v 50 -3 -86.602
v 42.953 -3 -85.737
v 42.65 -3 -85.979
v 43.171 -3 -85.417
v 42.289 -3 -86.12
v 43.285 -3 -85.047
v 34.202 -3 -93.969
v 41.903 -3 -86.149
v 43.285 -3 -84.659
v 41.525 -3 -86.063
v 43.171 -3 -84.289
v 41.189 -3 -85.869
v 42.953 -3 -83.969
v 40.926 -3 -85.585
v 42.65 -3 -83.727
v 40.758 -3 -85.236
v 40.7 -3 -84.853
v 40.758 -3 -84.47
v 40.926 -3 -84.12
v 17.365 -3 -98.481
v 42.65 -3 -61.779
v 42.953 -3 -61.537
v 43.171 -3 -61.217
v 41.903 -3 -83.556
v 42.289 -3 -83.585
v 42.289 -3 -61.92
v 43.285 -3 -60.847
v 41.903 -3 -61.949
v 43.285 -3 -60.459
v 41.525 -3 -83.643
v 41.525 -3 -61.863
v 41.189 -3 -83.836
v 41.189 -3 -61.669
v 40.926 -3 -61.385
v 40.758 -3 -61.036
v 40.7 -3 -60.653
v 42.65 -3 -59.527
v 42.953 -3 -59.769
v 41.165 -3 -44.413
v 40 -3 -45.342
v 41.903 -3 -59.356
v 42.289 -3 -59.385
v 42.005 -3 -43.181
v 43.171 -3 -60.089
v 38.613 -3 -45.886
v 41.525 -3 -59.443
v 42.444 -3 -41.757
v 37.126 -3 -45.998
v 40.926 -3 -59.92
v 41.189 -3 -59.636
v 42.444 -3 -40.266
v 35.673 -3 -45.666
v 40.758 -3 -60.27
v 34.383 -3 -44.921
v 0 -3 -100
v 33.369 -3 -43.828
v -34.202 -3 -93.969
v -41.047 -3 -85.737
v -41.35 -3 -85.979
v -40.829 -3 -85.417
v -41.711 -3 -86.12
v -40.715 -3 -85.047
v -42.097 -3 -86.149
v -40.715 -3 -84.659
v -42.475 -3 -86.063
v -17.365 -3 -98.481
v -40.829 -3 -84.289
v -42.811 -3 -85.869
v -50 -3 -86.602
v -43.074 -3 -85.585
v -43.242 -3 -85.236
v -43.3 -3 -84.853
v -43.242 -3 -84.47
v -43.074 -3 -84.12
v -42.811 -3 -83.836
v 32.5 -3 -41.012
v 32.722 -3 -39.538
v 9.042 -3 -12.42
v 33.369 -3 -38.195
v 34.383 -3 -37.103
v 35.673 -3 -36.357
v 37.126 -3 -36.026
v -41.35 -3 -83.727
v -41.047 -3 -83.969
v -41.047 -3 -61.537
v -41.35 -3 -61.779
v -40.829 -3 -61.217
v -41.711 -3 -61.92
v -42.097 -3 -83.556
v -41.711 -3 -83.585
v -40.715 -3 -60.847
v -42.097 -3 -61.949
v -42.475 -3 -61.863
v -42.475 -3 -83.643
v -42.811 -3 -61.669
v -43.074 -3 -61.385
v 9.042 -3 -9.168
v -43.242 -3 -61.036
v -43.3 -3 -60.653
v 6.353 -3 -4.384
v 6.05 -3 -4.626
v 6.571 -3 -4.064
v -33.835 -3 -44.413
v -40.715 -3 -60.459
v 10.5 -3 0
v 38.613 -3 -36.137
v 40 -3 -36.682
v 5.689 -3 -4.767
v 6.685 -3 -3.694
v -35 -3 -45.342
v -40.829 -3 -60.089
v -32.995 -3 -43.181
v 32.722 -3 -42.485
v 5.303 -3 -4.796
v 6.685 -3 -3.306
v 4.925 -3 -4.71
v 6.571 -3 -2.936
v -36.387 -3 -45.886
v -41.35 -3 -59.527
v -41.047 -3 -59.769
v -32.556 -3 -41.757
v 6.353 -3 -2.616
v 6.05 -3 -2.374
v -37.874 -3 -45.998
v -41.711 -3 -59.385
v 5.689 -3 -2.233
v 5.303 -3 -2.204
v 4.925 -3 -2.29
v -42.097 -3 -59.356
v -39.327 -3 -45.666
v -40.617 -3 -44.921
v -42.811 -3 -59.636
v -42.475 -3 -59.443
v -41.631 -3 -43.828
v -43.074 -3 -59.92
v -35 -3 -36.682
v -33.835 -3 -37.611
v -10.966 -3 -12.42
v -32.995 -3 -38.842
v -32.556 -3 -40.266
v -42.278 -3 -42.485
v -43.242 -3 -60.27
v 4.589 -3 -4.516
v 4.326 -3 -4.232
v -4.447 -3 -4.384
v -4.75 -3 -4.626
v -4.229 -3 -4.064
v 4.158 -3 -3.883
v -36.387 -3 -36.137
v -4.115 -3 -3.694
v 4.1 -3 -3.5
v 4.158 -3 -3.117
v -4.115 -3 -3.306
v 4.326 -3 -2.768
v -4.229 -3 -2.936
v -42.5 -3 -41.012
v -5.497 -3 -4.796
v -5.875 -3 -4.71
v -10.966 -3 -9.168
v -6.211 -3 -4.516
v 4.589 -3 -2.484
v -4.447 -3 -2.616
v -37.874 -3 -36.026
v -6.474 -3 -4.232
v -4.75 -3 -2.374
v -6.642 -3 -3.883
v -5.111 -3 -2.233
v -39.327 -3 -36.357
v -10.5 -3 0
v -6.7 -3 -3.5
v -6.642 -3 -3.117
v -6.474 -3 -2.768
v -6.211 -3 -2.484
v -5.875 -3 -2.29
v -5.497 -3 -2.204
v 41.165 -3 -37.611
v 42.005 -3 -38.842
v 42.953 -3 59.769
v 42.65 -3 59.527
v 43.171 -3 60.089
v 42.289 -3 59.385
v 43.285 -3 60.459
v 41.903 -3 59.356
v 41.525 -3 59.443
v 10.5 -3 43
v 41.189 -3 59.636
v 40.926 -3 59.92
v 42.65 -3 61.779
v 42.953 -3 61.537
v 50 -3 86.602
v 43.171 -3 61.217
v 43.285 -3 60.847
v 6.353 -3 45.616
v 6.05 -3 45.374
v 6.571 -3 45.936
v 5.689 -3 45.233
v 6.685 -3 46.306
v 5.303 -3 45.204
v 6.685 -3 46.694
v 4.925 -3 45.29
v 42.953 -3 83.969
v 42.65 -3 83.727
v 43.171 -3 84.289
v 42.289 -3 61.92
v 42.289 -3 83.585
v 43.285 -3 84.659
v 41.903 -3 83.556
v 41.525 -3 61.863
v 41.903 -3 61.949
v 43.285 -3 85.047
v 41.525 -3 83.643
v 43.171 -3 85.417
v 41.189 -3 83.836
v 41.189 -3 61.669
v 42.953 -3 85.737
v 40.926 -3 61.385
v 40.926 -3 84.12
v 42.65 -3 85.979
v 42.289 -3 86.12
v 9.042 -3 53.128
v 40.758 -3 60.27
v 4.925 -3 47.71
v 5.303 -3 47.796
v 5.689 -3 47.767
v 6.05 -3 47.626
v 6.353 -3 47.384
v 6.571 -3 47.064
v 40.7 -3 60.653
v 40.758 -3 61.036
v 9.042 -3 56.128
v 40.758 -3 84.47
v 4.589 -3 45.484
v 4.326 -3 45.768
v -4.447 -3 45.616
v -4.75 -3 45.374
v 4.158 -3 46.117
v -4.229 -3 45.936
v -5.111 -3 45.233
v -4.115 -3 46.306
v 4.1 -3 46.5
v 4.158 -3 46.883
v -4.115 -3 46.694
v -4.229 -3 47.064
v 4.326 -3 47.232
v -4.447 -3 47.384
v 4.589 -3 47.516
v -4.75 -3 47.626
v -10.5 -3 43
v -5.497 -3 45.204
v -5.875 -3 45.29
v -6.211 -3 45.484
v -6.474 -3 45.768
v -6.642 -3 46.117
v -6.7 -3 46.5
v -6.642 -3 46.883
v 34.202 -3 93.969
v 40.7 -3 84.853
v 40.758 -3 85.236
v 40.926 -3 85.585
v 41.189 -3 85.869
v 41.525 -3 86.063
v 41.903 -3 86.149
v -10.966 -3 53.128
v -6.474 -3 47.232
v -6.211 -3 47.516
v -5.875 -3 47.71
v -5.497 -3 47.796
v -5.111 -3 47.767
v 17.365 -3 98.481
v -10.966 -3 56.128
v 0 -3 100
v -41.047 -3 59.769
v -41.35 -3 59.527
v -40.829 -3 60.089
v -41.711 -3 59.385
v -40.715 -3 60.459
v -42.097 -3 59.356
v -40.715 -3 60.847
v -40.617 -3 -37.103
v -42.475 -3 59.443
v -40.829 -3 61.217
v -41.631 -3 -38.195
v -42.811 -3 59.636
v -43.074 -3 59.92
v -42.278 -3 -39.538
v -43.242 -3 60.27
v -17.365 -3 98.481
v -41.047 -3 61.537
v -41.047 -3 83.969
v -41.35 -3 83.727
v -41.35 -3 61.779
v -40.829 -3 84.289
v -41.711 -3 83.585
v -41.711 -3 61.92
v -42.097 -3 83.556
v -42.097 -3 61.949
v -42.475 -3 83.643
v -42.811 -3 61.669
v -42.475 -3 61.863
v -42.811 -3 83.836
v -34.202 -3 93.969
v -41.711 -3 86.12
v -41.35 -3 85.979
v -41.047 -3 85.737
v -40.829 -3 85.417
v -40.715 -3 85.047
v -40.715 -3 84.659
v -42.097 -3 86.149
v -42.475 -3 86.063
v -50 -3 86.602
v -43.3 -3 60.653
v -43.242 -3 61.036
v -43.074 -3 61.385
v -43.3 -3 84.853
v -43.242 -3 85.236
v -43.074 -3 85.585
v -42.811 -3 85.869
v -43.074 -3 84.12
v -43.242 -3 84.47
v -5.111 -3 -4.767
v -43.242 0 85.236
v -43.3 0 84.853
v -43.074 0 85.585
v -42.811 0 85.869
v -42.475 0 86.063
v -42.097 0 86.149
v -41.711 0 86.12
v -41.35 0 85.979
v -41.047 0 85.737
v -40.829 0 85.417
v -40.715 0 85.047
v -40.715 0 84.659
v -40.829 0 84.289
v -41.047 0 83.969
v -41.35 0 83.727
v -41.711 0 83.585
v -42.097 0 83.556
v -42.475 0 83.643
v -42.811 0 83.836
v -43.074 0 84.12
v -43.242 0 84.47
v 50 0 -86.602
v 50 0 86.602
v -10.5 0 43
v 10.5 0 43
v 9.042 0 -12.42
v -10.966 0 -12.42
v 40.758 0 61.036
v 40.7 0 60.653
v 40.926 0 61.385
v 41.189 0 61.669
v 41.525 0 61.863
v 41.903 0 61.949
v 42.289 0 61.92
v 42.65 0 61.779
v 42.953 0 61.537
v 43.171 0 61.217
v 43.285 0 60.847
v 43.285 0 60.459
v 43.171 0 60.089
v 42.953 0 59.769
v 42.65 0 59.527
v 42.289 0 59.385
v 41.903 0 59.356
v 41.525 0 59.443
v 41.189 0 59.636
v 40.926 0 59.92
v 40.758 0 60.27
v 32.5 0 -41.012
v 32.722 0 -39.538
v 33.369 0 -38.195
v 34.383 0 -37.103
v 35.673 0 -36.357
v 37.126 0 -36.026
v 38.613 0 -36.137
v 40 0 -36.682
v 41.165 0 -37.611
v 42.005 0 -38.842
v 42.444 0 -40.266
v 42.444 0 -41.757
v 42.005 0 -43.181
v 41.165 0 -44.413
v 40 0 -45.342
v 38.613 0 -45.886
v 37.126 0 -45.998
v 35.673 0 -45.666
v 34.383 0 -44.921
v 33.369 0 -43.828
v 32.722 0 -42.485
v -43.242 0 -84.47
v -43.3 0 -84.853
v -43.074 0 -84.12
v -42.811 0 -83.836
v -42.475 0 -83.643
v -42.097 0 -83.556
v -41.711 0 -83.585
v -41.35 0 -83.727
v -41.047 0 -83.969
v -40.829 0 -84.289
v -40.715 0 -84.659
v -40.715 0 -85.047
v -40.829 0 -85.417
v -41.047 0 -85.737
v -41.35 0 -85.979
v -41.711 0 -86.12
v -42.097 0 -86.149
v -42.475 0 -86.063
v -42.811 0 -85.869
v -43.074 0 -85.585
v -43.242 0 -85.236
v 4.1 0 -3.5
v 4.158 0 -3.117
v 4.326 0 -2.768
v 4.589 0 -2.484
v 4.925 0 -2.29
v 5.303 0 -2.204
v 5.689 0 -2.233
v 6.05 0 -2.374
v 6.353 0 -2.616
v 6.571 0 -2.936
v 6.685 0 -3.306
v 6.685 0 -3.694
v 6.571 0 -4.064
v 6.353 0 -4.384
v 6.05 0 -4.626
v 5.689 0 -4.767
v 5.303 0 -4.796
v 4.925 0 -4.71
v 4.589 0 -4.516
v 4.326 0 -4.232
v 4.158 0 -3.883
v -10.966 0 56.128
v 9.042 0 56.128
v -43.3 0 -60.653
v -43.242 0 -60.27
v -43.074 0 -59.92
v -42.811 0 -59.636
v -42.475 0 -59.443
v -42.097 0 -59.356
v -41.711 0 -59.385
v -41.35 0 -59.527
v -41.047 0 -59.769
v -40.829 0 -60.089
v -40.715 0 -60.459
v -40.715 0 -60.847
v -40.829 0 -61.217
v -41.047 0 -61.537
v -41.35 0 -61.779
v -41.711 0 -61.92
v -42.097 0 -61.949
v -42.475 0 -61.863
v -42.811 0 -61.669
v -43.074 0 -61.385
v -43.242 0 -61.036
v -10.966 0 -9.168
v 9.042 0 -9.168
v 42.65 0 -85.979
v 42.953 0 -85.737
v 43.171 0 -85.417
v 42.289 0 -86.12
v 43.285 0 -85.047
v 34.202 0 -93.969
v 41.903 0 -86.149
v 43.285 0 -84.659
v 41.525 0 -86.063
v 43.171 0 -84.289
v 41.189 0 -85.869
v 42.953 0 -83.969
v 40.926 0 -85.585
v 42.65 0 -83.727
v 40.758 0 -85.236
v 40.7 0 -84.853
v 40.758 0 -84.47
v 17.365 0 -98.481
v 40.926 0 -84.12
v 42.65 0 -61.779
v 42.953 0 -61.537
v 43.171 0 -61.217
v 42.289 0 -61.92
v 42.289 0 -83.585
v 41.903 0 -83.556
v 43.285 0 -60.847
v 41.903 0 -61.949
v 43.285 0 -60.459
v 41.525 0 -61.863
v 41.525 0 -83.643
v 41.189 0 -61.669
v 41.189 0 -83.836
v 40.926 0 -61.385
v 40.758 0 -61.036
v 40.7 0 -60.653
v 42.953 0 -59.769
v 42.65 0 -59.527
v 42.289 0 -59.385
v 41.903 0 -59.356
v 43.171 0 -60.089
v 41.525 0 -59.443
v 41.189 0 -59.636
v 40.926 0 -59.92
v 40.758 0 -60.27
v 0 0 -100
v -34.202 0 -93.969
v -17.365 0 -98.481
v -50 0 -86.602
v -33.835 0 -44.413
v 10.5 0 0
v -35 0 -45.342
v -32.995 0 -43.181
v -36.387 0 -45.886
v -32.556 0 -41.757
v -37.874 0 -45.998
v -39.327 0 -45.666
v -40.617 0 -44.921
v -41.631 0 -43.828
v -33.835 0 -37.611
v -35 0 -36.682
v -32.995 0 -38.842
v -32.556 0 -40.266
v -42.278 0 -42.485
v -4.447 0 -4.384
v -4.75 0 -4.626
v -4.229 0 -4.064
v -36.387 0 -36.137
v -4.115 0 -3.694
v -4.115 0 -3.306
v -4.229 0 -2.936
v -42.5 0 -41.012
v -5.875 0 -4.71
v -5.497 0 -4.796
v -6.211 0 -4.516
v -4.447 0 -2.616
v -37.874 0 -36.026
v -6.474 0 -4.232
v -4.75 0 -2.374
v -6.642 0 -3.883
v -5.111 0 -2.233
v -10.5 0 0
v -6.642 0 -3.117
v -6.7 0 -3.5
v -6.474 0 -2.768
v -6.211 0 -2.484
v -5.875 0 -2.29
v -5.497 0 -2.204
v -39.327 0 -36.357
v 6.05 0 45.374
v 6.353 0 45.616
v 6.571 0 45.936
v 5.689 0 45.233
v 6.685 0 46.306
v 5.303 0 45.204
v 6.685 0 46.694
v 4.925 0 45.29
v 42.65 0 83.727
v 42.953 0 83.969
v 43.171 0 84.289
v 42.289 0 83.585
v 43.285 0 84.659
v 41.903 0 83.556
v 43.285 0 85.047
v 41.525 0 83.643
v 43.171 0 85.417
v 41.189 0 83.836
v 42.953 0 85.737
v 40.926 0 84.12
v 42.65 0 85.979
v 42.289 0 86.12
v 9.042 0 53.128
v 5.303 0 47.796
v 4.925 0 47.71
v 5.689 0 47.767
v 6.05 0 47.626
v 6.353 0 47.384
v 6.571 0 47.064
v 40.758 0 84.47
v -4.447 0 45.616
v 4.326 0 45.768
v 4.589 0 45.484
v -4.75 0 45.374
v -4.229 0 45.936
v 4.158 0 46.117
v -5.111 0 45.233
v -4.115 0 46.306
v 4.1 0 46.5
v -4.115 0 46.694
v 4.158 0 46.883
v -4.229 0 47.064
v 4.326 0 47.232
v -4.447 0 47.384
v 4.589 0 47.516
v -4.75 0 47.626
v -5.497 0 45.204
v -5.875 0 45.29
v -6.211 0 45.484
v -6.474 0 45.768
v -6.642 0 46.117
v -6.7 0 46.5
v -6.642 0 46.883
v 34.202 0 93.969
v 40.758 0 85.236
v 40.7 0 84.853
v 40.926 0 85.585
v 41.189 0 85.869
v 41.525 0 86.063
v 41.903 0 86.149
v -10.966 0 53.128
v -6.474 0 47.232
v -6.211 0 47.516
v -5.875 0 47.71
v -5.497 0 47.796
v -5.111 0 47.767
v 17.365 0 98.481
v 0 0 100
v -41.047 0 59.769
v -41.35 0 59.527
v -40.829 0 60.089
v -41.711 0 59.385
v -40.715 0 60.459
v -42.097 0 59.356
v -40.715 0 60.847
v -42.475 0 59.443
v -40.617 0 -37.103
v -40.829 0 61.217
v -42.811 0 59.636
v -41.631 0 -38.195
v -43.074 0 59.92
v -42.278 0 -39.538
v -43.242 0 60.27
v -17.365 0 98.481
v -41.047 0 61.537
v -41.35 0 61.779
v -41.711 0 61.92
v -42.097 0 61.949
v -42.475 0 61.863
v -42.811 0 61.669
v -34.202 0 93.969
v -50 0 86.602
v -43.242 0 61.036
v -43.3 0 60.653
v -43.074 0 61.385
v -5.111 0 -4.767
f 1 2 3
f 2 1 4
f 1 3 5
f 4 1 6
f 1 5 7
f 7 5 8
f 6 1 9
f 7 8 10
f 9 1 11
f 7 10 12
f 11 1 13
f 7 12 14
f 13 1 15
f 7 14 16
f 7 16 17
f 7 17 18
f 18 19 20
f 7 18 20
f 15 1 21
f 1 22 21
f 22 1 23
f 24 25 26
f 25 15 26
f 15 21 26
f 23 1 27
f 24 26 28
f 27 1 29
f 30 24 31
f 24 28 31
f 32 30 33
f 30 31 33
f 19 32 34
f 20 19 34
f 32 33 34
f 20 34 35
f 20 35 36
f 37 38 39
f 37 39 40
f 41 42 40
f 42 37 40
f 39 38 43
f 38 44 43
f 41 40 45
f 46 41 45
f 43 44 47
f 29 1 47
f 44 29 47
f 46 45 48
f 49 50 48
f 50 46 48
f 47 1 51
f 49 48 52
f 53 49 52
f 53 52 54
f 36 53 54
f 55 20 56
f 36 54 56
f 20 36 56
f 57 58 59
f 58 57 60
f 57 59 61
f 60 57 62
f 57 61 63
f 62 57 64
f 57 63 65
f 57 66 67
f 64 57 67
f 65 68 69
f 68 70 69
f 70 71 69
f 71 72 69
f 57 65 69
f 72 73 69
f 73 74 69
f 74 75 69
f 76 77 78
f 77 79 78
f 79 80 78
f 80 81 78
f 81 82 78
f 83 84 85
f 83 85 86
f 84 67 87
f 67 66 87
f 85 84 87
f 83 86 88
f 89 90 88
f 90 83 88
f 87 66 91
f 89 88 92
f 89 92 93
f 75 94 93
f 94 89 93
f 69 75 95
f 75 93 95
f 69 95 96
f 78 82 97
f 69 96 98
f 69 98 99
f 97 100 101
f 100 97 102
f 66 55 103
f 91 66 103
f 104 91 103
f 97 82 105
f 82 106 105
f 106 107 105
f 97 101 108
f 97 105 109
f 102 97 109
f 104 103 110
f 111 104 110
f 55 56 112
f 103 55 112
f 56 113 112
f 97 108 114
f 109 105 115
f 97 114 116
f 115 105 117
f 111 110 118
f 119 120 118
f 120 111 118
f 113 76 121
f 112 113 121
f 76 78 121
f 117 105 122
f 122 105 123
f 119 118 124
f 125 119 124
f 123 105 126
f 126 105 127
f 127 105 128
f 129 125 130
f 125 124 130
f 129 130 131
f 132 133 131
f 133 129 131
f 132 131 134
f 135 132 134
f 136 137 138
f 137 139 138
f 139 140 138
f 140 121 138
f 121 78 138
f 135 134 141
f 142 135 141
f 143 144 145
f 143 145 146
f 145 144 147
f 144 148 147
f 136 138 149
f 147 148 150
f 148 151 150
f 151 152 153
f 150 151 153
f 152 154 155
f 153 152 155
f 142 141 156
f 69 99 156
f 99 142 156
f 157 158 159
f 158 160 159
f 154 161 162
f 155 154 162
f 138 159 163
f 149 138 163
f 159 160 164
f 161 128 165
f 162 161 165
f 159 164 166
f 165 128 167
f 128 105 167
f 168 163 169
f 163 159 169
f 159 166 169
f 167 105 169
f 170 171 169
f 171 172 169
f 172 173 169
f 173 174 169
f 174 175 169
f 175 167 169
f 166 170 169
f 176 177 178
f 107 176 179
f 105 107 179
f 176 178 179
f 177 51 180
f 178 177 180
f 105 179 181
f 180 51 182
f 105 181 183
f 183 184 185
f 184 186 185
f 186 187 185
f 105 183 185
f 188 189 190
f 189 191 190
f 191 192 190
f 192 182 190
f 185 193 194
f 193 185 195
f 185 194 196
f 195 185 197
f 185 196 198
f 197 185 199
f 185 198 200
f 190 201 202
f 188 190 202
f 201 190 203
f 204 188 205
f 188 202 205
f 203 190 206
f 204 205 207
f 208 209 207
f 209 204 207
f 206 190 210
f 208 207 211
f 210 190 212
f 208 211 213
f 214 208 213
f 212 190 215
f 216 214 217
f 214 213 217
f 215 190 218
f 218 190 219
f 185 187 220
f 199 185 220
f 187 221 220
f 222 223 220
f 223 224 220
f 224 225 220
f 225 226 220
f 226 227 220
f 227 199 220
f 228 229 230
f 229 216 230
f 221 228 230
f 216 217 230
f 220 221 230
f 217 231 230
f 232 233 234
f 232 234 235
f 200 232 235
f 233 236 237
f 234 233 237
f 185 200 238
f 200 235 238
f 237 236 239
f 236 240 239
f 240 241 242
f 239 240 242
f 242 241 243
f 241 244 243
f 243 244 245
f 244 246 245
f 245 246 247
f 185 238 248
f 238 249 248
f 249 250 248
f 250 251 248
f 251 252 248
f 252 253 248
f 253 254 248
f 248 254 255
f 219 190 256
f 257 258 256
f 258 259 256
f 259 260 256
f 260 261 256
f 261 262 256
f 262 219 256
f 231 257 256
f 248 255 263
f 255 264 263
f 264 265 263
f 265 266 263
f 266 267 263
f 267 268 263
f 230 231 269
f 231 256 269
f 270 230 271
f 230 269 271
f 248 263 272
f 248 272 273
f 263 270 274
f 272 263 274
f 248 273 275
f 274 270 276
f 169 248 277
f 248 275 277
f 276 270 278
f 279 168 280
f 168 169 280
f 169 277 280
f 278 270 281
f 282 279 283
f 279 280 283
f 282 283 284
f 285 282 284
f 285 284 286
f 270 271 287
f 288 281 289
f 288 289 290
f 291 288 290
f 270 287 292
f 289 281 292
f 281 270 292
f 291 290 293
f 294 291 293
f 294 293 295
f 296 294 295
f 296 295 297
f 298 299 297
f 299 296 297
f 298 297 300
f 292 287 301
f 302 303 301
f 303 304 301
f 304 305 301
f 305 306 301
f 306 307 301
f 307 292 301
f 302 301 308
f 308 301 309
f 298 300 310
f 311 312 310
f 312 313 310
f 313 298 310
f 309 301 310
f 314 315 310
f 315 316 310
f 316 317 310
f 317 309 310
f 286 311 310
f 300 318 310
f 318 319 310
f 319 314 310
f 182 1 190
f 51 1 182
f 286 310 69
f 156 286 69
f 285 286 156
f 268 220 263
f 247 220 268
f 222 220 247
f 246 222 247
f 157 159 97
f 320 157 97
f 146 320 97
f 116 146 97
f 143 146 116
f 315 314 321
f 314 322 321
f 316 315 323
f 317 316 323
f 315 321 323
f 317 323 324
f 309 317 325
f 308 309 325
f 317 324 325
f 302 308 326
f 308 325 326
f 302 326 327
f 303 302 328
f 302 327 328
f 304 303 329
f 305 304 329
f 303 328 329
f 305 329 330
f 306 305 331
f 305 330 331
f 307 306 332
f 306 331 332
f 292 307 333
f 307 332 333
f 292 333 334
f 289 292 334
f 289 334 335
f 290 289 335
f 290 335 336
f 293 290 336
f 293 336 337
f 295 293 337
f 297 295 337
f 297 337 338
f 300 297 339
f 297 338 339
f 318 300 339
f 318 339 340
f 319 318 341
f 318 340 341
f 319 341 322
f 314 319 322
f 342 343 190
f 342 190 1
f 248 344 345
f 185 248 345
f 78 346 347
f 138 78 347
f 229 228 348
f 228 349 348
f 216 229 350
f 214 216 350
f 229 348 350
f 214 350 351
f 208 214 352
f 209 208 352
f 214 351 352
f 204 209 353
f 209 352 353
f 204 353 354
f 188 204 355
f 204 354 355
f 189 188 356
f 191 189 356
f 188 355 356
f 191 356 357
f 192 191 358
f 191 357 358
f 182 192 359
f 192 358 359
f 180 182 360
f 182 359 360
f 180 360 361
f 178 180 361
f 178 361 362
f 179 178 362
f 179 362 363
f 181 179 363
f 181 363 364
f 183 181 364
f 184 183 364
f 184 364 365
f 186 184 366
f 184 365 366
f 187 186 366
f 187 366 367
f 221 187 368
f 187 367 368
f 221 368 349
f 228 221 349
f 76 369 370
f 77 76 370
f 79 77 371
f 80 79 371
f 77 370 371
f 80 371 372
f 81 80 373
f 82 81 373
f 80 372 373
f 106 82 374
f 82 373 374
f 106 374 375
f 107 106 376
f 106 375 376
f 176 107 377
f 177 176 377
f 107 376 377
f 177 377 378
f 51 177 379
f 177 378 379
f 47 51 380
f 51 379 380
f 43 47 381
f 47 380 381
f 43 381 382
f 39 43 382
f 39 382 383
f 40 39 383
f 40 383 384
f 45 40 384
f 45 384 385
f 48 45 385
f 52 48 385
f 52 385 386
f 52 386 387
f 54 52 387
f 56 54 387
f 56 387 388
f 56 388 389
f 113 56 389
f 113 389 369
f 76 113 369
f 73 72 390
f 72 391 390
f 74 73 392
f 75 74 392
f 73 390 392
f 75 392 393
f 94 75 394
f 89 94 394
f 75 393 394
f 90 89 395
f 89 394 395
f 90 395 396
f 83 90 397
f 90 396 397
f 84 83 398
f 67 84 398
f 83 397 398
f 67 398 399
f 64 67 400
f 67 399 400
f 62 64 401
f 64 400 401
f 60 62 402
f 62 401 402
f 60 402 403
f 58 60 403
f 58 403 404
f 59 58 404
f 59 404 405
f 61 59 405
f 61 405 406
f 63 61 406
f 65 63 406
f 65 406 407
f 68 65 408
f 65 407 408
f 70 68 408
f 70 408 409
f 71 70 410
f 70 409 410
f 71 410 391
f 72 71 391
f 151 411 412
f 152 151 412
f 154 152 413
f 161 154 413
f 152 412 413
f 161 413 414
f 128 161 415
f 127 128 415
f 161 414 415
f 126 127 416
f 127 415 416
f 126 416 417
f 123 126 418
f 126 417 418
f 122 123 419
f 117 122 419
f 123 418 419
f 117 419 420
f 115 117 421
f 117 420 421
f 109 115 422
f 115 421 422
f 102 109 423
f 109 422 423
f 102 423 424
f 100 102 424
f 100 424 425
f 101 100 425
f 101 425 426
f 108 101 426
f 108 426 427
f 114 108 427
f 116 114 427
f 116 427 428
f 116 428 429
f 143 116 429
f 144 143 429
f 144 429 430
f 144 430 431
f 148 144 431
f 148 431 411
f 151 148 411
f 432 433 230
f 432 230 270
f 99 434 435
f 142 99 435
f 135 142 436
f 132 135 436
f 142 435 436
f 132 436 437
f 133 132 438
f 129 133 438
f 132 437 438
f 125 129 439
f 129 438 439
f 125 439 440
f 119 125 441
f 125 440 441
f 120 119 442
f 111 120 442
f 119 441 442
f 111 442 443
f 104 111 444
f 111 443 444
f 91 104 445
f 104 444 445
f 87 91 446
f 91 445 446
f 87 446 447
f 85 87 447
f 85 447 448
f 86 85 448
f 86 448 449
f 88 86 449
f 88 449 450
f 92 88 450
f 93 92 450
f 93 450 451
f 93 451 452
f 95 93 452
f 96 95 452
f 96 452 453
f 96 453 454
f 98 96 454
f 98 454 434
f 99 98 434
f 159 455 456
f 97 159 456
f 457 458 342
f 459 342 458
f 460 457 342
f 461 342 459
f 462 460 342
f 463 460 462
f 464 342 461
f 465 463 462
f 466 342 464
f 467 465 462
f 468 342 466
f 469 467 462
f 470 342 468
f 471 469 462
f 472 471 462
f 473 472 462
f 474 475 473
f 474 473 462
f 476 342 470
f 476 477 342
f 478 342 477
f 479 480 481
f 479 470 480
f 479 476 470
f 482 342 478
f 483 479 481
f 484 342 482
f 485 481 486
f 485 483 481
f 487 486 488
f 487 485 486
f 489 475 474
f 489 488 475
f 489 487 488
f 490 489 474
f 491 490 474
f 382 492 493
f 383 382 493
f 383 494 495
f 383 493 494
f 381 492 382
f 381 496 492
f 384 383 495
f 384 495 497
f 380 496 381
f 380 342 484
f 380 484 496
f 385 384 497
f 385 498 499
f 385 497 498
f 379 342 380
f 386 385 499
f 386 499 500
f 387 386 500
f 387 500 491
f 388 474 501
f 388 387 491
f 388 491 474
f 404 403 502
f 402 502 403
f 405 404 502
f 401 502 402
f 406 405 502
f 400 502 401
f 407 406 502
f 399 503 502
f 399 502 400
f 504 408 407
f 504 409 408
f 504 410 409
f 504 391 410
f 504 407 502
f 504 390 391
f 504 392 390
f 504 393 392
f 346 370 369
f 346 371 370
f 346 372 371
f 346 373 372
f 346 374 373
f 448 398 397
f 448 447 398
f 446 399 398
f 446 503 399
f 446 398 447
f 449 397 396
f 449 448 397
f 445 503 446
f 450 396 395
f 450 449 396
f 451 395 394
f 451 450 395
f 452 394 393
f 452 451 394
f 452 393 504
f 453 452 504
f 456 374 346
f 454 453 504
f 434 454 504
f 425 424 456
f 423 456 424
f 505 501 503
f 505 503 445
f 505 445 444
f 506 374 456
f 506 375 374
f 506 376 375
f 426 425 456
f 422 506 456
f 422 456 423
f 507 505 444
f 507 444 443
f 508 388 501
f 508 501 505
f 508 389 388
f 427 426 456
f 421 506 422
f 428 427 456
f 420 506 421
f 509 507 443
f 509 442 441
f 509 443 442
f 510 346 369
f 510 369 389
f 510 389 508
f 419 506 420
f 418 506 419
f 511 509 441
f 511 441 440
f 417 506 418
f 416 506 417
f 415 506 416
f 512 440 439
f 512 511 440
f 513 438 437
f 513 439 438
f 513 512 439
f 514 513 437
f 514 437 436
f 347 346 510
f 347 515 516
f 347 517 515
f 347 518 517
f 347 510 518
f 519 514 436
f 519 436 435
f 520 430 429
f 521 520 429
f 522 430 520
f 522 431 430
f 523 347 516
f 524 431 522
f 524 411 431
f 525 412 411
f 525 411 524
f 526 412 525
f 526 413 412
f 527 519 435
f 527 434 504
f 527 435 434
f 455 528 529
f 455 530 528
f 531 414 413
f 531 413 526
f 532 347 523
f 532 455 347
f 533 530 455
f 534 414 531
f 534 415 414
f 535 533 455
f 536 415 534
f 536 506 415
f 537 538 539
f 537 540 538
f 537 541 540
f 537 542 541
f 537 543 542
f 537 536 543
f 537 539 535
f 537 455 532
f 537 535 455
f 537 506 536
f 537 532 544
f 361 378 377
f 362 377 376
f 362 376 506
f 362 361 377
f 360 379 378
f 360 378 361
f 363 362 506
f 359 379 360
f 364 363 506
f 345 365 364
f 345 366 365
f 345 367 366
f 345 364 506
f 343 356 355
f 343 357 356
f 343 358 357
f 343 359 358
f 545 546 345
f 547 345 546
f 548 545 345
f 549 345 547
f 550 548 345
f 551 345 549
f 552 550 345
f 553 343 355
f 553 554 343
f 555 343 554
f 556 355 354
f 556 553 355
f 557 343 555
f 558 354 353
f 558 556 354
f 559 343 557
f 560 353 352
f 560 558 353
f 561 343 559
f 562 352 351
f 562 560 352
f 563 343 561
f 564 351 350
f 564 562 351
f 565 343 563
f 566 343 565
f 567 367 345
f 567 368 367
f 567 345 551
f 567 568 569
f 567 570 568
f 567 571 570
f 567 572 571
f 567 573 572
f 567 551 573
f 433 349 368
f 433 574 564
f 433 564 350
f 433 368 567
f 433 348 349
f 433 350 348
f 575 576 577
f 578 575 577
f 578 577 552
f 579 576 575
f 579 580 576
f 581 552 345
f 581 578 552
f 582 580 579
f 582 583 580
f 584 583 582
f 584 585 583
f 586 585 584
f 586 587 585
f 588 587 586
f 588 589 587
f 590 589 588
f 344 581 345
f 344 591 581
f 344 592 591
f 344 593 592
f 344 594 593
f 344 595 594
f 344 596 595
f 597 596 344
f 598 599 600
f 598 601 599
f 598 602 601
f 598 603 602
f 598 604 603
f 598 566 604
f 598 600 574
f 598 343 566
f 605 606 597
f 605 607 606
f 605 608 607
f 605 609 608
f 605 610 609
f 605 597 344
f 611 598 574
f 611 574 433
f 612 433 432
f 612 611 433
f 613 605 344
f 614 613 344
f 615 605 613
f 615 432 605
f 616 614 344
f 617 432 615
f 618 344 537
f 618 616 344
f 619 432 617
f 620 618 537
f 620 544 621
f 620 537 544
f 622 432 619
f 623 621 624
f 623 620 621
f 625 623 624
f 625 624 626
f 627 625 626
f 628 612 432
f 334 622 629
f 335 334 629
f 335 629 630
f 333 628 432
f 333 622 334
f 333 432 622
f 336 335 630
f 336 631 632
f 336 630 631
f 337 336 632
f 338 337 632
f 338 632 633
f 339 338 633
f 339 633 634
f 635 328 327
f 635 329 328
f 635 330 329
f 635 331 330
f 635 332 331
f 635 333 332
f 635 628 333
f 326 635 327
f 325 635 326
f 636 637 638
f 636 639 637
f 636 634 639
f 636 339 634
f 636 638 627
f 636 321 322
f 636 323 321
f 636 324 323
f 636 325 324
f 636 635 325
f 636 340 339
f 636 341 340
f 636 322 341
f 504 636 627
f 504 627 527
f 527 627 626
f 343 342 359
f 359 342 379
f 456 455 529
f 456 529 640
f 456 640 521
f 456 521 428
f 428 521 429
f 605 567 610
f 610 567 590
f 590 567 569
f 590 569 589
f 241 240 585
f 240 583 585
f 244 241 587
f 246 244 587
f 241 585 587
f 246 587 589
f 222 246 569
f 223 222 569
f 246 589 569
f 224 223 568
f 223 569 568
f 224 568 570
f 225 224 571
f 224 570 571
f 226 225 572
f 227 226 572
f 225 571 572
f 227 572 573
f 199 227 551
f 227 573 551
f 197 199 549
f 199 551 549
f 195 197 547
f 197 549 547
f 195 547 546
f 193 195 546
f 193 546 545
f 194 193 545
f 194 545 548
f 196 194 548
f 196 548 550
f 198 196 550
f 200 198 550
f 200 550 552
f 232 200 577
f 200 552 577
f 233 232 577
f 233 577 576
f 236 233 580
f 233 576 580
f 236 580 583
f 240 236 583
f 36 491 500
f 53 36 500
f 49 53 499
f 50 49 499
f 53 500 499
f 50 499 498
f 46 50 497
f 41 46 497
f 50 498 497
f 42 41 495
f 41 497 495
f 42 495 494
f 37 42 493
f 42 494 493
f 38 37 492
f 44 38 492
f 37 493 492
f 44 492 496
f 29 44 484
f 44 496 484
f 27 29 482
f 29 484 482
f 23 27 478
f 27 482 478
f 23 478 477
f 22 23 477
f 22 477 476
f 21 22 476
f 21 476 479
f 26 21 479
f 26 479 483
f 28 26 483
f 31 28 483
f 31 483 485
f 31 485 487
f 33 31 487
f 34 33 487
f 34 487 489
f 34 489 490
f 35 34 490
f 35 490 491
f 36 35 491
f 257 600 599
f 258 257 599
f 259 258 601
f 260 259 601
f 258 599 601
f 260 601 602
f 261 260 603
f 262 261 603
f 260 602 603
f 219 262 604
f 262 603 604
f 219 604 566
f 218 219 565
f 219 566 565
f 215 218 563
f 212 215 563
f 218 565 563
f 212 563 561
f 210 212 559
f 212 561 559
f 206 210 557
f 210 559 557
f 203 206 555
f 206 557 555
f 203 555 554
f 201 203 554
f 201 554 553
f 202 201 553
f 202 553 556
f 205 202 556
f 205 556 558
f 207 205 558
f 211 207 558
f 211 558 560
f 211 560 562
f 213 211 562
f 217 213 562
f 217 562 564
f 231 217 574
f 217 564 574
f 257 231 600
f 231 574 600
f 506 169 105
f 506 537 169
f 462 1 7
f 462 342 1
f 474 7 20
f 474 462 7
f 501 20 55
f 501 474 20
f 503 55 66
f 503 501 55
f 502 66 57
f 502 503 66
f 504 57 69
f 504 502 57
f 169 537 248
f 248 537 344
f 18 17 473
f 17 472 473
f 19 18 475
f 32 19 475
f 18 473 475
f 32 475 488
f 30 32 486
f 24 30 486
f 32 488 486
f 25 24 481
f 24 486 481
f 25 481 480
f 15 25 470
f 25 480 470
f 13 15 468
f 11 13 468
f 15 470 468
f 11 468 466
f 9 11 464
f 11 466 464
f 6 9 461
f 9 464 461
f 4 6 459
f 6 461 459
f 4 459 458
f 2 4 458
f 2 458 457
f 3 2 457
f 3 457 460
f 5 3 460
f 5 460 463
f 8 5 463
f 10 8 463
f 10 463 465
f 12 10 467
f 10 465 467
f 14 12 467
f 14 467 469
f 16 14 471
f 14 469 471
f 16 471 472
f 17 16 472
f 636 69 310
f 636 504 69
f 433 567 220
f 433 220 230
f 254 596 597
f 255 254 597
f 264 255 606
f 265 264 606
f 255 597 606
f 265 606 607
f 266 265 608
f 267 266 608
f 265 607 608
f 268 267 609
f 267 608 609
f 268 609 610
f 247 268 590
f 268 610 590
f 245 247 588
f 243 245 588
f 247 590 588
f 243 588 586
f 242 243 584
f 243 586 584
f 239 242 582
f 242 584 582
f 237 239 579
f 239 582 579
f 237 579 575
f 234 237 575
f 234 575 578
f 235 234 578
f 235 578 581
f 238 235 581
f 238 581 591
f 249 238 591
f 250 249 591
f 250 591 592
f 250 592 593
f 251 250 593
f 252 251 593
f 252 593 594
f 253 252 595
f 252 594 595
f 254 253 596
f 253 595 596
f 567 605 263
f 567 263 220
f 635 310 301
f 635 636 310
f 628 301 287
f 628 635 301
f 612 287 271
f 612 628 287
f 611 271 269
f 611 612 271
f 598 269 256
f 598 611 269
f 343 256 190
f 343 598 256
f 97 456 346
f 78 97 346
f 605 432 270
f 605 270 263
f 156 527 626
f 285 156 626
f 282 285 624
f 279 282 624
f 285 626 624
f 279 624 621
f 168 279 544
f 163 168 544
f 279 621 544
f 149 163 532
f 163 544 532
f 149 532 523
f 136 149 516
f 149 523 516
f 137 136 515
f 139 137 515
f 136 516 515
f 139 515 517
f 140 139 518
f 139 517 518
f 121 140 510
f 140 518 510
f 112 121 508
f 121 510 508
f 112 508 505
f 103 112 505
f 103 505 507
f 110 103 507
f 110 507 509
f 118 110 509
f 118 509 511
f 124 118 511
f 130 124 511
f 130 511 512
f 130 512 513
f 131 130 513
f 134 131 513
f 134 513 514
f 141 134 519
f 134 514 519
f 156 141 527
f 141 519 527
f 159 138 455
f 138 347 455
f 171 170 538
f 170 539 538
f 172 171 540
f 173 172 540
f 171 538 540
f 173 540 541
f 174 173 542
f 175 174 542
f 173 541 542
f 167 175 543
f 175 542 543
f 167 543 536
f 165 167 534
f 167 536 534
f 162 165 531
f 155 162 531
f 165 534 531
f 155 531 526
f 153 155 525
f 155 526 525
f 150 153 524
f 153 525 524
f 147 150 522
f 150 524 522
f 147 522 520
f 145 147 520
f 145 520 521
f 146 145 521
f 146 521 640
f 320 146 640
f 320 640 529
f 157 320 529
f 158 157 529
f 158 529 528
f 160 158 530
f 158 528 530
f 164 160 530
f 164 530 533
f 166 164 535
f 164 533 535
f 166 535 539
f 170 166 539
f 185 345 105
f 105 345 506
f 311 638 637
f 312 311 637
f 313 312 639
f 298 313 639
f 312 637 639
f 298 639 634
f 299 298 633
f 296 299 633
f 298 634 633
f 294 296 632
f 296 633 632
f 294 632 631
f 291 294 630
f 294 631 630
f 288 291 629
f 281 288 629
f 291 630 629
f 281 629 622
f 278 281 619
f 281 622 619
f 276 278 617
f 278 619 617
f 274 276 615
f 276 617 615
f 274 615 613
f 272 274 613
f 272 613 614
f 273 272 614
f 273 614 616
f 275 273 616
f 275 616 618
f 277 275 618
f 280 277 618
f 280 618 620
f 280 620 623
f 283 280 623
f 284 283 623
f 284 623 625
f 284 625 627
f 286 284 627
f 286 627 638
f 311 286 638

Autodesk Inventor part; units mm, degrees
ref_plane "YZ Plane" through (0, 0, 0) normal (1, 0, 0) x (0, 1, 0)
ref_plane "XZ Plane" through (0, 0, 0) normal (0, 1, 0) x (-1, 0, 0)
ref_plane "XY Plane" through (0, 0, 0) normal (0, 0, 1) x (1, 0, 0)
sketch "Sketch1" plane through (0, 0, 0) normal (0, 1, 0) x (-1, 0, 0)
  line L0 (-50, 86.6025) -> (-50, -86.6025)
  line L1 (50, -86.6025) -> (50, 86.6025)
  arc A0 (50, 86.6025) -> (-50, 86.6025) centre (0, 0) ccw
  arc A1 (-50, -86.6025) -> (50, -86.6025) centre (0, 0) ccw
  circle A2 centre (42, -84.8528) radius 1.3
  circle A3 centre (42, -60.6528) radius 1.3
  circle A4 centre (-42, -84.8528) radius 1.3
  circle A5 centre (-42, -60.6528) radius 1.3
  circle A6 centre (42, 84.8528) radius 1.3
  circle A7 centre (42, 60.6528) radius 1.3
  circle A8 centre (-42, 84.8528) radius 1.3
  circle A9 centre (-42, 60.6528) radius 1.3
  circle A10 centre (37.5, -41.0117) radius 5
  circle A11 centre (-37.5, -41.0117) radius 5
  line L2 (10.5, 0) -> (10.5, 43)
  line L3 (10.5, 43) -> (-10.5, 43)
  line L4 (-10.5, 43) -> (-10.5, 0)
  line L5 (10.5, 0) -> (-10.5, 0)
  circle A12 centre (-5.4, -3.5) radius 1.3
  circle A13 centre (5.4, -3.5) radius 1.3
  circle A14 centre (5.4, 46.5) radius 1.3
  circle A15 centre (-5.4, 46.5) radius 1.3
  circle A16 centre (-2.7764, -36.0117) radius 16.406
extrude "Extrusion1" add sketch "Sketch1" against normal blind 3 contours A0 L1 A1 L0 | A16
sketch "Sketch2" plane through (0, 0, 0) normal (0, 1, 0) x (1, 0, 0)
  line L0 (-10.966, 9.168) -> (9.0417, 9.168)
  line L1 (9.0417, 9.168) -> (9.0417, 12.4204)
  line L2 (9.0417, 12.4204) -> (-10.966, 12.4204)
  line L3 (-10.966, 12.4204) -> (-10.966, 9.168)
  line L4 (-10.966, -53.1278) -> (9.0417, -53.1278)
  line L5 (9.0417, -53.1278) -> (9.0417, -56.1278)
  line L6 (9.0417, -56.1278) -> (-10.966, -56.1278)
  line L7 (-10.966, -56.1278) -> (-10.966, -53.1278)
  point P0 (0, 0)
extrude "Extrusion2" cut sketch "Sketch2" against normal blind 3
properties part number "topPlate1"
